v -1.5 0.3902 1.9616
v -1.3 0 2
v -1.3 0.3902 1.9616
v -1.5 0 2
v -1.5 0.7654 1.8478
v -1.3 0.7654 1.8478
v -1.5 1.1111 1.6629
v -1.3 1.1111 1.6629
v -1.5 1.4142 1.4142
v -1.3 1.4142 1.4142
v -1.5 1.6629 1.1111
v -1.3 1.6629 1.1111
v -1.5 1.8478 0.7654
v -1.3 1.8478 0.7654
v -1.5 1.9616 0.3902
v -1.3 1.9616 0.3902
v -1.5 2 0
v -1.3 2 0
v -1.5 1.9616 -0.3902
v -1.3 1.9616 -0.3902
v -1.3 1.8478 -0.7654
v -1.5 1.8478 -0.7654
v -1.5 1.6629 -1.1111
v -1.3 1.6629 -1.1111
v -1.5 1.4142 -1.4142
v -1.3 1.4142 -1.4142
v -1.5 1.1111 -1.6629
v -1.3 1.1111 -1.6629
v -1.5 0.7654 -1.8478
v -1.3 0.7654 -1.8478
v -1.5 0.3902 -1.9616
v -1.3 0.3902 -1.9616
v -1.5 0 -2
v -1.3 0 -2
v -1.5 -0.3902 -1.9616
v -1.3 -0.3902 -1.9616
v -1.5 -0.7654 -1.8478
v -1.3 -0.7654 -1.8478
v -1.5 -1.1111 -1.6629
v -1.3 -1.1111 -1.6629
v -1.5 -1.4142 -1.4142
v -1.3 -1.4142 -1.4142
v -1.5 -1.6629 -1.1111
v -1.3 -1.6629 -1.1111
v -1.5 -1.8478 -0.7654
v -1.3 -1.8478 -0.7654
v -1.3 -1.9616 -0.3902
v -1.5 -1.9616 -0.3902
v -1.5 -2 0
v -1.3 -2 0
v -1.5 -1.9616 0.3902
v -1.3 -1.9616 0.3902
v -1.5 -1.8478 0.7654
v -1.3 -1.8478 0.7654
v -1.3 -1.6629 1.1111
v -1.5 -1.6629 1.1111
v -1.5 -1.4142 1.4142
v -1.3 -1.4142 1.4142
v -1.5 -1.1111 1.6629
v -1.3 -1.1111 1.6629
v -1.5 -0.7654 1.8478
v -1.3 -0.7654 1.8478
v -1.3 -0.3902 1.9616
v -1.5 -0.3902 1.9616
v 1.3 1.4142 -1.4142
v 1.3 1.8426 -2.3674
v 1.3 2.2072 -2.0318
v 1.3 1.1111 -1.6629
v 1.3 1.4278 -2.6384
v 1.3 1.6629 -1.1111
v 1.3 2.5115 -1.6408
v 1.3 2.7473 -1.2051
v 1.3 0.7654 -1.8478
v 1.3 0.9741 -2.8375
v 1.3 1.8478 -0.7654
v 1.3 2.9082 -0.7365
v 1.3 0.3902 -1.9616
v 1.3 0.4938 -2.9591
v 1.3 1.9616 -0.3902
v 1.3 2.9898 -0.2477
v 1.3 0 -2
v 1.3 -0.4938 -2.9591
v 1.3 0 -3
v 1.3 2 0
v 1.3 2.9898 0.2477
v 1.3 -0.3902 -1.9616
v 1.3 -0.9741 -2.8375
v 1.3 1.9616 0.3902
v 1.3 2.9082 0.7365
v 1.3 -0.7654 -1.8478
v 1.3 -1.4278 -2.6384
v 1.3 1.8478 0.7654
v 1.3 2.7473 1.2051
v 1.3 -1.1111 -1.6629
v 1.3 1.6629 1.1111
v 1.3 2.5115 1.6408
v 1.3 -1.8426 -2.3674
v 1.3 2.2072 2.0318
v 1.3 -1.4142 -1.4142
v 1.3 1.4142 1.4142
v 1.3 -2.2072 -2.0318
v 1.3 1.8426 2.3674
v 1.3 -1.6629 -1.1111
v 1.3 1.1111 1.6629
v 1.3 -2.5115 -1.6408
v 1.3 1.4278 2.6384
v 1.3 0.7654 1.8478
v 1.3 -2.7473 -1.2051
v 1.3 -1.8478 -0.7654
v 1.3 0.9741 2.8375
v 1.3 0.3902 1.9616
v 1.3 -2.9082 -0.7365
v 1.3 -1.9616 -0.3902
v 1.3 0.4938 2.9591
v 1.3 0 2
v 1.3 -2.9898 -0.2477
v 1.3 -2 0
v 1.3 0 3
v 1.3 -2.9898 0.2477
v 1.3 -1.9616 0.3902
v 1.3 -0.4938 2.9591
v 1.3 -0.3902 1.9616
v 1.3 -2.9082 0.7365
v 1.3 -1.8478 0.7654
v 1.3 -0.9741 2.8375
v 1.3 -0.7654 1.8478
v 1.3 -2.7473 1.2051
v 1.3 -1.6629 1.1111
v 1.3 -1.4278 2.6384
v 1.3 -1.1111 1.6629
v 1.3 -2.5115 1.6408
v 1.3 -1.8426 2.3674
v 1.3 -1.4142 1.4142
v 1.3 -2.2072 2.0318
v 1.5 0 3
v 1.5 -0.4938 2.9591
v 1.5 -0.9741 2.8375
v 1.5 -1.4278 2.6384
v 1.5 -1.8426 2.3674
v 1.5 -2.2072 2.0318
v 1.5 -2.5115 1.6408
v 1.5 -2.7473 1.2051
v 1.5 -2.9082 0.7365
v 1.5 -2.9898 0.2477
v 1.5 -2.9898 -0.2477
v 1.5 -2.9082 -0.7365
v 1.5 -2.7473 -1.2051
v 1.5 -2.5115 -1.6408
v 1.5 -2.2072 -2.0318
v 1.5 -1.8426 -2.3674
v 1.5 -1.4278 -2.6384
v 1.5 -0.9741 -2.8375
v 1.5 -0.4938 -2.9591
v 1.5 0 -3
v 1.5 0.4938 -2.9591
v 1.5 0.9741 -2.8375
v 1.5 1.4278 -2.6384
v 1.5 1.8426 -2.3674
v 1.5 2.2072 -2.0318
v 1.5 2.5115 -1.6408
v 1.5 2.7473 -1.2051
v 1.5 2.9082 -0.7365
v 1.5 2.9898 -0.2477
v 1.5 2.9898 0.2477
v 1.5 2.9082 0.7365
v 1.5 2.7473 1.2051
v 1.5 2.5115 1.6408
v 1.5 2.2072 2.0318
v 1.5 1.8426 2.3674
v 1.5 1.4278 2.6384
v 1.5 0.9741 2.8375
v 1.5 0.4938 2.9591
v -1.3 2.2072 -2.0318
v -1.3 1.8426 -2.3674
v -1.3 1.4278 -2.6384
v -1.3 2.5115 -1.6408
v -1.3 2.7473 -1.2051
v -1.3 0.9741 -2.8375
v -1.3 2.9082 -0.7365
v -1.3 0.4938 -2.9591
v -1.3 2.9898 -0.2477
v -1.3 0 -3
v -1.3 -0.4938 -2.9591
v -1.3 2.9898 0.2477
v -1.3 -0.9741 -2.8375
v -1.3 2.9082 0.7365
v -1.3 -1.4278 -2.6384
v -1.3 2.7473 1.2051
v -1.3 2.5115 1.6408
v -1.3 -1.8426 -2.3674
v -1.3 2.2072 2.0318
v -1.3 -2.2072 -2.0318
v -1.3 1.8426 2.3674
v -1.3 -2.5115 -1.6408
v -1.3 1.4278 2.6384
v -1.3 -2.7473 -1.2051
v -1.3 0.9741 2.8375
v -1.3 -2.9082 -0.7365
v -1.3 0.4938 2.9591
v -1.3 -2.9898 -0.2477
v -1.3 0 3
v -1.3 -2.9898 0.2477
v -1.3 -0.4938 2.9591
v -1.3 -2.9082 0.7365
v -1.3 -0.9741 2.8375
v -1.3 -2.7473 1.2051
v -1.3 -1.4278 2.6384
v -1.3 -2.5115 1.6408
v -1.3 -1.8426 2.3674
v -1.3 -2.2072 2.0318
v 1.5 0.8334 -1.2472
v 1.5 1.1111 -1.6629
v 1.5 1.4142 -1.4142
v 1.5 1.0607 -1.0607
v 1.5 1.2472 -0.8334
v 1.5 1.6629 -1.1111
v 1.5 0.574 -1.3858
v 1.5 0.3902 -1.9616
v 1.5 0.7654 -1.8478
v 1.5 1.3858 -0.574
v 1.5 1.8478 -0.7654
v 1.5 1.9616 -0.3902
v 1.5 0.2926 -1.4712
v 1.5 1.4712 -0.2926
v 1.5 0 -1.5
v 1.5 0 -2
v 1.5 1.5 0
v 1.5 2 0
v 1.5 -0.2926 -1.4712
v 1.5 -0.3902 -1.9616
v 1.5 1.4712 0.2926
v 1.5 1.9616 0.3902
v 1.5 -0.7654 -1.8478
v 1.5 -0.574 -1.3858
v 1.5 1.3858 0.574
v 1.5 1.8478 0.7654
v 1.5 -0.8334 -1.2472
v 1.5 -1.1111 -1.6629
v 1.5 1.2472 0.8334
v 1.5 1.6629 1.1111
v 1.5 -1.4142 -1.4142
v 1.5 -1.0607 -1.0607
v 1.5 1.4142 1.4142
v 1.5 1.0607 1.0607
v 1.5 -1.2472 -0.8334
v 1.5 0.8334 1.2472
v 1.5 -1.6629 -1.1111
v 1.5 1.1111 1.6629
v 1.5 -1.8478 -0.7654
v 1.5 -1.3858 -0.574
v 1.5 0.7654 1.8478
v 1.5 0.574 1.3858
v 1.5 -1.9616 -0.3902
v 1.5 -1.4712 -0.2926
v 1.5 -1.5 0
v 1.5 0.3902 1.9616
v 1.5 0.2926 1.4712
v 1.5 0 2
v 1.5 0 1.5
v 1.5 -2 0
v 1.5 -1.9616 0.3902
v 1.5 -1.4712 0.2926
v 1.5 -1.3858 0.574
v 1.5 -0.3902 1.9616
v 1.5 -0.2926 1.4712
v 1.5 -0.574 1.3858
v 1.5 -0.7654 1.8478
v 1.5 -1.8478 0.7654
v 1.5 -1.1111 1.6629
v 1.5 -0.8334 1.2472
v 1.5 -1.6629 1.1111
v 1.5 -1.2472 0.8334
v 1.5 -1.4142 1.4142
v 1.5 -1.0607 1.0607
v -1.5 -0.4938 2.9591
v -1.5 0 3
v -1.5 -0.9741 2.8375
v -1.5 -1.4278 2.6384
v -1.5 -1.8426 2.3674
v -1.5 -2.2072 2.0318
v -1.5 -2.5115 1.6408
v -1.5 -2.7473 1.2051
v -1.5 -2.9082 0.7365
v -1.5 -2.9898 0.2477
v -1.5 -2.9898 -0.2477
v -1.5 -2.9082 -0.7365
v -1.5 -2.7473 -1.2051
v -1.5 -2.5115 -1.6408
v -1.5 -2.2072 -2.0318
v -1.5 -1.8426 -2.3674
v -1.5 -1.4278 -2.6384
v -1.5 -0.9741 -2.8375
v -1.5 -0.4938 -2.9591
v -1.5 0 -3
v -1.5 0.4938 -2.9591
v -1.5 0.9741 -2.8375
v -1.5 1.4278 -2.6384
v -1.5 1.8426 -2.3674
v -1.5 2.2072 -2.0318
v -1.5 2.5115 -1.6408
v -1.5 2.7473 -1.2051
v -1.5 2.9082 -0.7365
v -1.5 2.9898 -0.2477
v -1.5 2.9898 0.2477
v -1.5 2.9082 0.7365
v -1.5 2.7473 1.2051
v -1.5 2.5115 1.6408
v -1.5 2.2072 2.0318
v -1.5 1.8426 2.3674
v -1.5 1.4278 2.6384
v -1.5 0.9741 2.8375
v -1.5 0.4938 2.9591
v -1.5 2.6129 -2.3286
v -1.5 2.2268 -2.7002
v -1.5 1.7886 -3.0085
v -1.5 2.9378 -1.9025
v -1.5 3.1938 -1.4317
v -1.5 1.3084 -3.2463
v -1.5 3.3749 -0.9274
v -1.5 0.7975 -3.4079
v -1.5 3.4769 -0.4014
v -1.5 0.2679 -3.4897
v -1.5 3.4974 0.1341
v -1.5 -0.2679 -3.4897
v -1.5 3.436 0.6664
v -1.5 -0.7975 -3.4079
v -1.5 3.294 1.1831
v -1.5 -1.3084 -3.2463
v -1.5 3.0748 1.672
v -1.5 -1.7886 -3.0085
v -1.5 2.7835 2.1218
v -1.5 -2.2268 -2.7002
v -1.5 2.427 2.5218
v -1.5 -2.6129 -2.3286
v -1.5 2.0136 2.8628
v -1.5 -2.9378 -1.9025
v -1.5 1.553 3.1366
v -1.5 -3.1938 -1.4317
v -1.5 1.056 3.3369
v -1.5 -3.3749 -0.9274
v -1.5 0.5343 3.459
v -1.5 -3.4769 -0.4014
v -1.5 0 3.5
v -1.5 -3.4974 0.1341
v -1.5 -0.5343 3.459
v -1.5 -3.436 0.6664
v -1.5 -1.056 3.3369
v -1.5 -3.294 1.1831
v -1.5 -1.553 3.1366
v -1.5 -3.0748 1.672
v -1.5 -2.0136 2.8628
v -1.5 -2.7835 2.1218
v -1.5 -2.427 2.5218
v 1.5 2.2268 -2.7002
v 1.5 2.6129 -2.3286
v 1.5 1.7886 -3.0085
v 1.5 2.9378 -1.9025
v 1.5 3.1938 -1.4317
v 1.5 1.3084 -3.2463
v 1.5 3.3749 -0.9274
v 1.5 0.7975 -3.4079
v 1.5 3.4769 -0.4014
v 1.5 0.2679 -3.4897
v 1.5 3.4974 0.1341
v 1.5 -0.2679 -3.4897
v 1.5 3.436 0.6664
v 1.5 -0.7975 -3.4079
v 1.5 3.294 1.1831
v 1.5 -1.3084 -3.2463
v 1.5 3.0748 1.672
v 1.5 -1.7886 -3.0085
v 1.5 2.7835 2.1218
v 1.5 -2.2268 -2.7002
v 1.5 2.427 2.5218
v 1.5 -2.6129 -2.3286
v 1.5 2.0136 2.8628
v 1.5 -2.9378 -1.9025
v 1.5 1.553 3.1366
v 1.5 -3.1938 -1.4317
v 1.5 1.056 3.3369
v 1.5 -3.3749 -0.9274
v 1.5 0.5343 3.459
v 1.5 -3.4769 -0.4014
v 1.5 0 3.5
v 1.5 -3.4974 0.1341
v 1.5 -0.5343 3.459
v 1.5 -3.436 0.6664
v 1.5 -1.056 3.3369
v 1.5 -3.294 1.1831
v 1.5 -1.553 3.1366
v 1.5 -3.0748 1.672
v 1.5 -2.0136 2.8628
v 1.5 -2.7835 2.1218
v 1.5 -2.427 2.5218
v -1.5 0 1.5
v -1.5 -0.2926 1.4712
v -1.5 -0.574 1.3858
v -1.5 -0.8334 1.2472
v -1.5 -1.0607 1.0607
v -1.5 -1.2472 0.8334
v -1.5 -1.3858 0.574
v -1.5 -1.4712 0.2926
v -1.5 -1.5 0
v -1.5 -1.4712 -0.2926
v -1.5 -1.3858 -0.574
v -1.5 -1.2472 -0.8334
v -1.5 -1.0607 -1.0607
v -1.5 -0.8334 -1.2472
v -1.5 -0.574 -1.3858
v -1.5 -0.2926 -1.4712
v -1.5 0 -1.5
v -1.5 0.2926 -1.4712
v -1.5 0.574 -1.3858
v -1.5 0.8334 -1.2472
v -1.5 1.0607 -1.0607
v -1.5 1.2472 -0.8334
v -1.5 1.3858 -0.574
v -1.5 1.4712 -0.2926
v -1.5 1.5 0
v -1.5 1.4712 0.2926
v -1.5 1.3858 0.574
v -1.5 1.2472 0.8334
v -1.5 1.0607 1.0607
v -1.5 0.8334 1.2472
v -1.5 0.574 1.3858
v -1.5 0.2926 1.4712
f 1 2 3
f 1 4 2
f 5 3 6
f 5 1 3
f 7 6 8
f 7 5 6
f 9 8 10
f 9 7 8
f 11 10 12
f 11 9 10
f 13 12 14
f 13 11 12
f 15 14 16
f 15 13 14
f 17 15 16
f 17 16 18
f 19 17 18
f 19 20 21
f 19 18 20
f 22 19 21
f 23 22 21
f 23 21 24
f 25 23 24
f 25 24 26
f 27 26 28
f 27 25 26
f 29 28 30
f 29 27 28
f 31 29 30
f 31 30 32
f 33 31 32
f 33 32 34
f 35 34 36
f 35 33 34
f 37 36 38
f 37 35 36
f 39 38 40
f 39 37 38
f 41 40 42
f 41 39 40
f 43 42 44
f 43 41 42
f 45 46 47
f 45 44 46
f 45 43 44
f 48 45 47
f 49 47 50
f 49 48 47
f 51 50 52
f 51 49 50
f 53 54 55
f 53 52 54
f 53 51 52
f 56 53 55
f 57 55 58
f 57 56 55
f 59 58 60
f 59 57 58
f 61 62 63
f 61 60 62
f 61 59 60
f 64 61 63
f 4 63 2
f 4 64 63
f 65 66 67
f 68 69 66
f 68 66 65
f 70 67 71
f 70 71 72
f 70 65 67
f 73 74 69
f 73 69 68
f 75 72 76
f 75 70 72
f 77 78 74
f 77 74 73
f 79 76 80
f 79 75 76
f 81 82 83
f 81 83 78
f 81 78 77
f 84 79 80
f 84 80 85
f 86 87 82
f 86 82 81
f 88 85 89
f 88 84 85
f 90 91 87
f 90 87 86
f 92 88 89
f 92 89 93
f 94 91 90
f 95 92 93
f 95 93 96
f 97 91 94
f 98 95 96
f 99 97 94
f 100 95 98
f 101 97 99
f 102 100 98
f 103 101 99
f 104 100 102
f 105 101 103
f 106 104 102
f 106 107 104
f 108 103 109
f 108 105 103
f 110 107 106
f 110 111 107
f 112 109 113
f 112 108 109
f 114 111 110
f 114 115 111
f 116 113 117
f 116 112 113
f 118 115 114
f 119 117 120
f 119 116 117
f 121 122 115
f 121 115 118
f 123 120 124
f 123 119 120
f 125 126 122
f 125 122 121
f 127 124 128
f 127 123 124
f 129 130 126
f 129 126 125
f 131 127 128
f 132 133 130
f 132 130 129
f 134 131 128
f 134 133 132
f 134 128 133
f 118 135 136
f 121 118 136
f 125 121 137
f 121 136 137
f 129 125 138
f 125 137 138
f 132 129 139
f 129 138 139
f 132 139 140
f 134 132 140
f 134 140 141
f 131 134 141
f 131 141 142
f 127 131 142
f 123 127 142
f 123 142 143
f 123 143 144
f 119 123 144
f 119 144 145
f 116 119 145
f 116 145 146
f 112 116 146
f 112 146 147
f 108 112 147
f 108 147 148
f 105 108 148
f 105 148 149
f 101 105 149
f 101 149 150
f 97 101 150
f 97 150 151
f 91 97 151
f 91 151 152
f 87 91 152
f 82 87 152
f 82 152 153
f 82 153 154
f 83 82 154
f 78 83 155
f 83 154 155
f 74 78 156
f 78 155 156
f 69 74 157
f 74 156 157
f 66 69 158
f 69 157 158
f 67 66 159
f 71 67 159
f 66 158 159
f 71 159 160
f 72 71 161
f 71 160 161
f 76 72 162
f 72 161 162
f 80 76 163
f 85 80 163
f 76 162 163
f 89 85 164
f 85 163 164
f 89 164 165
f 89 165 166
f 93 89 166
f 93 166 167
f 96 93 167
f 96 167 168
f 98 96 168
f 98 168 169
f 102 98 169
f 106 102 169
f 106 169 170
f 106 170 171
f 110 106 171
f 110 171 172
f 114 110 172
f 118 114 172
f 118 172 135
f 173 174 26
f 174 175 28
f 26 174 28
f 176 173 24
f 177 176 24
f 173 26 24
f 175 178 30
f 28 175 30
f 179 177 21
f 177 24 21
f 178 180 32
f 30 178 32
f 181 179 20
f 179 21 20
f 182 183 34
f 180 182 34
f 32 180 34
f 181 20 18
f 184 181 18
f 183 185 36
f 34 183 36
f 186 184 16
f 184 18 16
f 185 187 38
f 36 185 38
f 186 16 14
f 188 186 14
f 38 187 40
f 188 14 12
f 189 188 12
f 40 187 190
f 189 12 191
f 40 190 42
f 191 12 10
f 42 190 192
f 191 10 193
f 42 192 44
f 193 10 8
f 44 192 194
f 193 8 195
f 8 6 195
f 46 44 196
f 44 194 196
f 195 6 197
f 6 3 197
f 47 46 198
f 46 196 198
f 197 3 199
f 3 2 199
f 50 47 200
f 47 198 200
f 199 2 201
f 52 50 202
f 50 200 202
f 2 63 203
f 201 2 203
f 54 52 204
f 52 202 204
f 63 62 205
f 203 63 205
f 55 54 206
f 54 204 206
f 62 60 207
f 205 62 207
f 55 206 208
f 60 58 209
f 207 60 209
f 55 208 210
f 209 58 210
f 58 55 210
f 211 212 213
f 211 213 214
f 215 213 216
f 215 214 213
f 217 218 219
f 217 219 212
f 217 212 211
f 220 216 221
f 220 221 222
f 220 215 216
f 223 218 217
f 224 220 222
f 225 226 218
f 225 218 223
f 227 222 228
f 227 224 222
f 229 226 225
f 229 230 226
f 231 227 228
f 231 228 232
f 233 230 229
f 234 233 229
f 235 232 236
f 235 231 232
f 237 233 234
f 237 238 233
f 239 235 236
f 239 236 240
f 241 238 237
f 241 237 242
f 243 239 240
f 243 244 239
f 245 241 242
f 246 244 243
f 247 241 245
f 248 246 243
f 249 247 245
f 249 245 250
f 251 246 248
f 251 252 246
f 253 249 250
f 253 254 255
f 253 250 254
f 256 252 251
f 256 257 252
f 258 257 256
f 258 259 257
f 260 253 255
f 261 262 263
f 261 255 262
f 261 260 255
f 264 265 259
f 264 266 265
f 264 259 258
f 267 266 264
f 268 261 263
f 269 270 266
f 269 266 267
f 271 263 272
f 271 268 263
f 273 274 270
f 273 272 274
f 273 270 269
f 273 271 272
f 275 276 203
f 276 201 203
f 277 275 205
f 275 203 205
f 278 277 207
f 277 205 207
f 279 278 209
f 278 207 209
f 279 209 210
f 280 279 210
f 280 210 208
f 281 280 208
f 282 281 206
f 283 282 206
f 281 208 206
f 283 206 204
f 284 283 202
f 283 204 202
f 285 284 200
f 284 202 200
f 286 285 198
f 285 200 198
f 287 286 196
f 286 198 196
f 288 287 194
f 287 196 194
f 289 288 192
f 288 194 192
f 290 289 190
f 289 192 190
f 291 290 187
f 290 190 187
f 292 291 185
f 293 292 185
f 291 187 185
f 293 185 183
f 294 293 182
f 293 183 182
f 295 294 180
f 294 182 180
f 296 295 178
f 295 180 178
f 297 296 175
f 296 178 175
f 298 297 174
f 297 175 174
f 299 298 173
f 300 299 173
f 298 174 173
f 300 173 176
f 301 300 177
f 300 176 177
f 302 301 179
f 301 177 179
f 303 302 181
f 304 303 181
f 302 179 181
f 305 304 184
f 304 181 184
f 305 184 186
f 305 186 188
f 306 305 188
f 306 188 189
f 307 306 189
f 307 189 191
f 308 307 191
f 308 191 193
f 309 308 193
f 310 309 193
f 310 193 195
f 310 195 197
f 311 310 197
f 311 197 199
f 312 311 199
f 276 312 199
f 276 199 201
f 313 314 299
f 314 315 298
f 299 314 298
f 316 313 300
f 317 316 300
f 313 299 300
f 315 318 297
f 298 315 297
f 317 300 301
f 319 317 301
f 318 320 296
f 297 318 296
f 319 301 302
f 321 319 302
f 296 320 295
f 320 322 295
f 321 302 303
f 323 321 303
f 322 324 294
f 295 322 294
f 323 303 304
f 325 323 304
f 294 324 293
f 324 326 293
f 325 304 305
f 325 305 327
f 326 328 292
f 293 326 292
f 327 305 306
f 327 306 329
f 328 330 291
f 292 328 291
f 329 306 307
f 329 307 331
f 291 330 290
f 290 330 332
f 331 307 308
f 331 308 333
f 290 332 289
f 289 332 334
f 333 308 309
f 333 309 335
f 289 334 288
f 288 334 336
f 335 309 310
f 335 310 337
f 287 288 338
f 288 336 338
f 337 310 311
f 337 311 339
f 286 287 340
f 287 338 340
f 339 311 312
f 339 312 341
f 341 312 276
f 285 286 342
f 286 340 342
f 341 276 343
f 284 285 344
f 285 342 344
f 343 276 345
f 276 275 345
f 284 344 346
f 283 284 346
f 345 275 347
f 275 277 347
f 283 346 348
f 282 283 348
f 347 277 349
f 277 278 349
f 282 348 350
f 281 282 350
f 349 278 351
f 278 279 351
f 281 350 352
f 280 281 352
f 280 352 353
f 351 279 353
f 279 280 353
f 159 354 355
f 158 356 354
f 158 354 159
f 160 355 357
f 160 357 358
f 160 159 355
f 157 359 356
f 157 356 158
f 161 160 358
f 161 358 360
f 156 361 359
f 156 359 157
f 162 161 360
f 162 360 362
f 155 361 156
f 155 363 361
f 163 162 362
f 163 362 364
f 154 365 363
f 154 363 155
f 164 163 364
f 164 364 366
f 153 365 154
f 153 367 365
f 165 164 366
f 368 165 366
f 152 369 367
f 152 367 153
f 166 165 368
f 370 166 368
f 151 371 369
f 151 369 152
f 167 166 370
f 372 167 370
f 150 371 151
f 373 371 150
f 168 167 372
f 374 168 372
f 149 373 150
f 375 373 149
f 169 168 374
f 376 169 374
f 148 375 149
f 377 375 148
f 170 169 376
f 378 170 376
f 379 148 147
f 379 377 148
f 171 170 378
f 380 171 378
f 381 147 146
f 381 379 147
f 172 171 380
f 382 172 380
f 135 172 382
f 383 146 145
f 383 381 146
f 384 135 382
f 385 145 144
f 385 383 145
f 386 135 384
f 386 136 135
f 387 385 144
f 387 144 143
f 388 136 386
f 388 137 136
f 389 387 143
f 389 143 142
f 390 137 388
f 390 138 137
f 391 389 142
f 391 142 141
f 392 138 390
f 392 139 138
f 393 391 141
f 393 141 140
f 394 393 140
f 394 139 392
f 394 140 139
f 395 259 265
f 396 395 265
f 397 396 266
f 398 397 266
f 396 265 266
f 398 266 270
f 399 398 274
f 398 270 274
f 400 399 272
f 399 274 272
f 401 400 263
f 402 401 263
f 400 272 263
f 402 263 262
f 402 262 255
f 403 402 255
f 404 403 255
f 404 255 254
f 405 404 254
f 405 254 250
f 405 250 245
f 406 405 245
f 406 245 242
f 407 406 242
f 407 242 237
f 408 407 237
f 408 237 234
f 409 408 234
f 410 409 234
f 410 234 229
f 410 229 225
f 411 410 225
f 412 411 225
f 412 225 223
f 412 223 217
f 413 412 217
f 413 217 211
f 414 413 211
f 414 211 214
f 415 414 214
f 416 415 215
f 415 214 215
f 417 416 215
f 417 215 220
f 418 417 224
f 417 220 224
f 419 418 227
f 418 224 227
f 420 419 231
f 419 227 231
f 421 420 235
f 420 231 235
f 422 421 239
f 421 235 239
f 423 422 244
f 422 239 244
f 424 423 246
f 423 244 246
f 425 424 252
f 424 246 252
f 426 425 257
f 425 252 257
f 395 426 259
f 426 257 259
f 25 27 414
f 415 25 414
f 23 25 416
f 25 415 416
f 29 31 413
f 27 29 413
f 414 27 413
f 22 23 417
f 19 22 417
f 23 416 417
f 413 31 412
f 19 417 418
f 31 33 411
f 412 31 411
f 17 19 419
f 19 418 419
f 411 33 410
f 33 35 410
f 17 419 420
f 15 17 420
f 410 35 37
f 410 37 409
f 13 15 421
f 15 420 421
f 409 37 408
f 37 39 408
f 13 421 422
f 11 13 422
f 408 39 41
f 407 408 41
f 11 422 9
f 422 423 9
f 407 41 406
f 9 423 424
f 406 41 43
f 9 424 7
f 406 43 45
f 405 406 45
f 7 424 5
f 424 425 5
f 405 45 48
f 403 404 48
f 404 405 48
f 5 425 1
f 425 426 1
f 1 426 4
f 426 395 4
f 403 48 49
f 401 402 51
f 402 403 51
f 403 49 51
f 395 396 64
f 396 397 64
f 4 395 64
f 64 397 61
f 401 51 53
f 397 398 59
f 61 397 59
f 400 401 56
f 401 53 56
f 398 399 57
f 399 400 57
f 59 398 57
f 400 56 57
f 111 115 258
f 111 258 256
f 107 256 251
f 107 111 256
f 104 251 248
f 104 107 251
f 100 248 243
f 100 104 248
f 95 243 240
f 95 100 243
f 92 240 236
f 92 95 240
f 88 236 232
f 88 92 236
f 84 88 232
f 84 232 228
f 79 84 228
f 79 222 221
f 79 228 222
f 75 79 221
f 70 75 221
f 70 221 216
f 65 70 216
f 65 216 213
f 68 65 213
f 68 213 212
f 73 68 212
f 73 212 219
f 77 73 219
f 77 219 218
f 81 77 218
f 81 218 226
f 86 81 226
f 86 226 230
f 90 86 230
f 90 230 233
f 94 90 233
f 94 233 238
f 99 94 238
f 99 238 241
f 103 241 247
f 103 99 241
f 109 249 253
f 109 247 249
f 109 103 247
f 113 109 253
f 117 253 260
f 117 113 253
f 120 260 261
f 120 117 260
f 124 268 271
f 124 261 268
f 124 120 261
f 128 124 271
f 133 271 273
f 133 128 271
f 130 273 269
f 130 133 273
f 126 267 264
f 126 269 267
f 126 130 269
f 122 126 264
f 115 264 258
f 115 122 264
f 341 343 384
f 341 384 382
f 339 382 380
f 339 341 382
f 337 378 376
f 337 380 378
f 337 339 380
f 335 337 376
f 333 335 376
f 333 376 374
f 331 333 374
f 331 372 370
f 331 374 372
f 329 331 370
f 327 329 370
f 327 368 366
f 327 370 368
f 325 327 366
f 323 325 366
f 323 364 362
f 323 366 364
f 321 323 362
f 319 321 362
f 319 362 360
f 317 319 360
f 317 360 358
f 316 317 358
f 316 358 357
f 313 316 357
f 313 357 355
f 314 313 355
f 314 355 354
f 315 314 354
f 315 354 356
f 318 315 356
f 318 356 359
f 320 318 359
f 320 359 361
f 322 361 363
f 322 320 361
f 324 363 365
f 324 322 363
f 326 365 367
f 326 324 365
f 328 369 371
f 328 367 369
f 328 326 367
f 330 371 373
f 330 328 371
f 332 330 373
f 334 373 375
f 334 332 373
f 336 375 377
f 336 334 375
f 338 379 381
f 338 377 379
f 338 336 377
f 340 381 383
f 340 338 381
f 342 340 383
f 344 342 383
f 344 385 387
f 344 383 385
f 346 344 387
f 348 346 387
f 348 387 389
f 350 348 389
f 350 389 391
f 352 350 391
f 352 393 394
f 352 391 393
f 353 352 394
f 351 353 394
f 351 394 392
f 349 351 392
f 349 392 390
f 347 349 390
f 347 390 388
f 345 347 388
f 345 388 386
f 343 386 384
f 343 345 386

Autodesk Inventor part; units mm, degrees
ref_plane "YZ Plane" through (0, 0, 0) normal (1, 0, 0) x (0, 1, 0)
ref_plane "XZ Plane" through (0, 0, 0) normal (0, 1, 0) x (-1, 0, 0)
ref_plane "XY Plane" through (0, 0, 0) normal (0, 0, 1) x (1, 0, 0)
sketch "Skizze1" plane through (0, 0, 0) normal (0, 1, 0) x (-1, 0, 0)
  line L0 (1.5, 0) -> (-1.5, 0)
  line L1 (1.5, 1.5) -> (-1.5, 1.5)
  line L2 (-1.5, 1.5) -> (-1.5, 2)
  line L3 (-1.5, 2) -> (-1.3, 2)
  line L4 (-1.3, 2) -> (-1.3, 3)
  line L5 (-1.3, 3) -> (-1.5, 3)
  line L6 (-1.5, 3) -> (-1.5, 3.5)
  line L7 (-1.5, 3.5) -> (1.5, 3.5)
  line L8 (1.5, 3.5) -> (1.5, 3)
  line L9 (1.5, 3) -> (1.3, 3)
  line L10 (1.3, 3) -> (1.3, 2)
  line L11 (1.3, 2) -> (1.5, 2)
  line L12 (1.5, 1.5) -> (1.5, 2)
  line L13 (0, -0.7) -> (0, 4.2) projected
  point P0 (0, 0)
  dimension "d0" = 3
  dimension "d1" = 7
  dimension "d2" = 3
  dimension "d3" = 0.2
  dimension "d4" = 0.5
  dimension "d5" = 0.5
revolve "Umdrehung1" add sketch "Skizze1" angle 360 about axis through (-1.5, 0, 0) along (1, 0, 0)
properties part number "Kugellager 683-ZZ" material "Stahl, weich, geschweißt"
